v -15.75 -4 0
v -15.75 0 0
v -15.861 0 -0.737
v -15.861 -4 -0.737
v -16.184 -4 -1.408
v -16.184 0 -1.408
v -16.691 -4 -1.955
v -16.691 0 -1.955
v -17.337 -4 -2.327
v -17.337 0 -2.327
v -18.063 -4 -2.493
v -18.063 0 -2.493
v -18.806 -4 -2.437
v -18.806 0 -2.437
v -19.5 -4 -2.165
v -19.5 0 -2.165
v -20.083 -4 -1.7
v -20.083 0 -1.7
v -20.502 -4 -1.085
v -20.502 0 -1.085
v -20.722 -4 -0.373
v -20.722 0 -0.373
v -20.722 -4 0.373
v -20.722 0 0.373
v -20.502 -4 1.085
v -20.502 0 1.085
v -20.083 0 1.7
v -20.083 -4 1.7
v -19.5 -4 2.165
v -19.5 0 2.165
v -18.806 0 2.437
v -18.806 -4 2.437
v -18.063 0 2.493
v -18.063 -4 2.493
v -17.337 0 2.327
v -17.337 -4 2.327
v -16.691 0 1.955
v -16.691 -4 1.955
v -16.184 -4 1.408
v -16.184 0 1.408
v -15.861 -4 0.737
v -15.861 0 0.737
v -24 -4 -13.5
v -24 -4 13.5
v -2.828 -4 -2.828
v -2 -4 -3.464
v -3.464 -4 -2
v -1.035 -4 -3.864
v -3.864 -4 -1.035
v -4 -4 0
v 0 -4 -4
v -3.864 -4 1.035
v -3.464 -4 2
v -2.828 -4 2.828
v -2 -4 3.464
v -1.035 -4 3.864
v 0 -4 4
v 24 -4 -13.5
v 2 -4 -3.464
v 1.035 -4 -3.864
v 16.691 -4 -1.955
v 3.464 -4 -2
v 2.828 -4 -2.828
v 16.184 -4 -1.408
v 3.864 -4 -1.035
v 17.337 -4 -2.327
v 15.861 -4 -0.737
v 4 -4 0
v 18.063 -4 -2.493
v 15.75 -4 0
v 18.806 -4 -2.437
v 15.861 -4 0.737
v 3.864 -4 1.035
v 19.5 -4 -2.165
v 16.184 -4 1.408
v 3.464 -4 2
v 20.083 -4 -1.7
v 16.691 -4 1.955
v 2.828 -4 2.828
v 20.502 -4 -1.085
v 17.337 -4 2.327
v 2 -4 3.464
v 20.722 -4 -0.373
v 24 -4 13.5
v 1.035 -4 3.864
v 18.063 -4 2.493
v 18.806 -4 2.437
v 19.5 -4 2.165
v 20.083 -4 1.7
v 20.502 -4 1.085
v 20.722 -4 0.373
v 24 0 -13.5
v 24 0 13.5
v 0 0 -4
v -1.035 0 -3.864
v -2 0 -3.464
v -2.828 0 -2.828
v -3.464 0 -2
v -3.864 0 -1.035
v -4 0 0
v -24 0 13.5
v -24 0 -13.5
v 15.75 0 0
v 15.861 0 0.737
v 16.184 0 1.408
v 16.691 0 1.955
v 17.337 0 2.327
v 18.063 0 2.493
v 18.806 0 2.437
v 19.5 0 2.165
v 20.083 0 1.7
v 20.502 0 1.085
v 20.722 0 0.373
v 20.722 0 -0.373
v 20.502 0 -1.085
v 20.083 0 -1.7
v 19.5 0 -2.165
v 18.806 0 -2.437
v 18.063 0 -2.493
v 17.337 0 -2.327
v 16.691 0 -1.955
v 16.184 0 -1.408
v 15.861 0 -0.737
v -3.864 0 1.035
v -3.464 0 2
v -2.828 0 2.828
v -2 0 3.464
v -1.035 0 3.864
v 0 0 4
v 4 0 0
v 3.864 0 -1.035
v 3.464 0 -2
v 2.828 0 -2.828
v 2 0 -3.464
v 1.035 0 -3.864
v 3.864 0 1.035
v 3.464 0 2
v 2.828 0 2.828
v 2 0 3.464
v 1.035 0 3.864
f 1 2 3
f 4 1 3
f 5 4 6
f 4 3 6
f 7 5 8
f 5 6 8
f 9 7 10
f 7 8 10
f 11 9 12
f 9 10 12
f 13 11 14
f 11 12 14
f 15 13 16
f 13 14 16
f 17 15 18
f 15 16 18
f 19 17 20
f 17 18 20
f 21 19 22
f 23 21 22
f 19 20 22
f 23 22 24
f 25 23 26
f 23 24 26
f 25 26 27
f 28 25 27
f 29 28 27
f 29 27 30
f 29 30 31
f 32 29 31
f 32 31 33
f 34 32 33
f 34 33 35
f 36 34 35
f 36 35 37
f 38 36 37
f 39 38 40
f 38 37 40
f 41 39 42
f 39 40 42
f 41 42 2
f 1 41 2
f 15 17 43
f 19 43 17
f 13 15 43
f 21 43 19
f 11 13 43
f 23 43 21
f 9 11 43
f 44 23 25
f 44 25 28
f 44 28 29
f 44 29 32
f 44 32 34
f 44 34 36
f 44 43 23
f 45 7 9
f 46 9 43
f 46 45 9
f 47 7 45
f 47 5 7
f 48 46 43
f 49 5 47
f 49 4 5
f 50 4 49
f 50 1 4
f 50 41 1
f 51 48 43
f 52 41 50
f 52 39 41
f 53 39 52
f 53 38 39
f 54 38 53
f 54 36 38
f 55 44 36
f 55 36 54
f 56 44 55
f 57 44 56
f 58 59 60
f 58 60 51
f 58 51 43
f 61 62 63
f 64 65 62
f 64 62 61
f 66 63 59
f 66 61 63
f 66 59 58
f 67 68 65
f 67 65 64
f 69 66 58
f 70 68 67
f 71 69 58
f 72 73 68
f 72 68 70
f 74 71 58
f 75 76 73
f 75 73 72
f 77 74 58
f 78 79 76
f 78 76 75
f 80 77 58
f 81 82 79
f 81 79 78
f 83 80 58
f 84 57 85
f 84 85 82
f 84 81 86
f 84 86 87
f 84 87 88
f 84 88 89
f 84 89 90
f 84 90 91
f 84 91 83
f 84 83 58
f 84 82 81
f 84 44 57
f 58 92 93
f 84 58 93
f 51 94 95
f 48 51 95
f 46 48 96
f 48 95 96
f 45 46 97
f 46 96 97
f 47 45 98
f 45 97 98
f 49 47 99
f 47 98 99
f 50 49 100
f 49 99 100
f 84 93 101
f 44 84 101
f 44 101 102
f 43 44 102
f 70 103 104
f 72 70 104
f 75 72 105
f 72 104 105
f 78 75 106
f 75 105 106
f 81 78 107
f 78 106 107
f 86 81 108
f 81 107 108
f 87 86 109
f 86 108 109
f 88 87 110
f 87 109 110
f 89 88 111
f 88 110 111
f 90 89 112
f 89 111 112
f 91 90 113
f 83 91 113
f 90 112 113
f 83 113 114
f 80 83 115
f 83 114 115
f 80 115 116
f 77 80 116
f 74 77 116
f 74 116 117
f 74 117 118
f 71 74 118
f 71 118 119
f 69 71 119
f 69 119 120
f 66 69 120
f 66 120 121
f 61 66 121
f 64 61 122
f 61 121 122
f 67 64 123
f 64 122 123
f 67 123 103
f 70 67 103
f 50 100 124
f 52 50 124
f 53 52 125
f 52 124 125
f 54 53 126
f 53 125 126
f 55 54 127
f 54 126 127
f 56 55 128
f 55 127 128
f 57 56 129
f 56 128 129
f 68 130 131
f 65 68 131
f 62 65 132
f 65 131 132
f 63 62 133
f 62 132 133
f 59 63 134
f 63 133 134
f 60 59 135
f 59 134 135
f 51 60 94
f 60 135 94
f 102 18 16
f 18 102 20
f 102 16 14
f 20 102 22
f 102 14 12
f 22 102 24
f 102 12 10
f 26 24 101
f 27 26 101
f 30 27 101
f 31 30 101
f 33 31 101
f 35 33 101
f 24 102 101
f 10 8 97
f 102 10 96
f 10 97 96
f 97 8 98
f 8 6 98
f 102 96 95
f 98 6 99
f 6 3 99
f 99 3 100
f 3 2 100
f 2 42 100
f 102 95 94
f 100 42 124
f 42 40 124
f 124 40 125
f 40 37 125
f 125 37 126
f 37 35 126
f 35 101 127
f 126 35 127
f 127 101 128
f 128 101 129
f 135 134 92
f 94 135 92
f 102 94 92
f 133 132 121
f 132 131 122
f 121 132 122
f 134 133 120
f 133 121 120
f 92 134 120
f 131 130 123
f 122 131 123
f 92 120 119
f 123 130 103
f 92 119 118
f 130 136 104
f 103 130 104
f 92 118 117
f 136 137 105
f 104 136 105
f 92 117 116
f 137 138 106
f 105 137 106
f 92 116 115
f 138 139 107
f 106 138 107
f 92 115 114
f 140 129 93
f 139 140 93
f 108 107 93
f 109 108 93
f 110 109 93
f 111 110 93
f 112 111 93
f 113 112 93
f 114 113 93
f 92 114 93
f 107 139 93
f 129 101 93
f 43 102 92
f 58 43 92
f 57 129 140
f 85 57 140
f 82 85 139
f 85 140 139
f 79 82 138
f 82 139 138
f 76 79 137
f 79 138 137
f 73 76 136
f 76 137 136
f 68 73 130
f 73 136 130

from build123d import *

# Parameters (mm, degrees)
F1_DEPTH = 4


with BuildPart() as f1:
    # F0 (on Front) → F1 (new body)
    with BuildSketch(Plane.XZ):
        with BuildLine():
            Line((15.75, 0), (4, 0))
            ThreePointArc((4, 0), (2.828427, -2.828427), (0, -4))
            Line((0, -4), (0, -13.5))
            Line((0, -13.5), (24, -13.5))
            Line((24, -13.5), (24, 0))
            Line((24, 0), (20.75, 0))
            ThreePointArc((20.75, 0), (18.25, -2.5), (15.75, 0))
        make_face()
        with BuildLine():
            ThreePointArc((0, 4), (2.828427, 2.828427), (4, 0))
            Line((4, 0), (15.75, 0))
            ThreePointArc((15.75, 0), (18.25, 2.5), (20.75, 0))
            Line((20.75, 0), (24, 0))
            Line((24, 0), (24, 13.5))
            Line((24, 13.5), (0, 13.5))
            Line((0, 13.5), (0, 4))
        make_face()
        with BuildLine():
            ThreePointArc((-4, 0), (-2.828427, 2.828427), (0, 4))
            Line((0, 4), (0, 13.5))
            Line((0, 13.5), (-24, 13.5))
            Line((-24, 13.5), (-24, 0))
            Line((-24, 0), (-20.75, 0))
            ThreePointArc((-20.75, 0), (-18.25, 2.5), (-15.75, 0))
            Line((-15.75, 0), (-4, 0))
        make_face()
        with BuildLine():
            Line((0, -13.5), (0, -4))
            ThreePointArc((0, -4), (-2.828427, -2.828427), (-4, 0))
            Line((-4, 0), (-15.75, 0))
            ThreePointArc((-15.75, 0), (-18.25, -2.5), (-20.75, 0))
            Line((-20.75, 0), (-24, 0))
            Line((-24, 0), (-24, -13.5))
            Line((-24, -13.5), (0, -13.5))
        make_face()
    extrude(amount=F1_DEPTH)


solid = f1.part
